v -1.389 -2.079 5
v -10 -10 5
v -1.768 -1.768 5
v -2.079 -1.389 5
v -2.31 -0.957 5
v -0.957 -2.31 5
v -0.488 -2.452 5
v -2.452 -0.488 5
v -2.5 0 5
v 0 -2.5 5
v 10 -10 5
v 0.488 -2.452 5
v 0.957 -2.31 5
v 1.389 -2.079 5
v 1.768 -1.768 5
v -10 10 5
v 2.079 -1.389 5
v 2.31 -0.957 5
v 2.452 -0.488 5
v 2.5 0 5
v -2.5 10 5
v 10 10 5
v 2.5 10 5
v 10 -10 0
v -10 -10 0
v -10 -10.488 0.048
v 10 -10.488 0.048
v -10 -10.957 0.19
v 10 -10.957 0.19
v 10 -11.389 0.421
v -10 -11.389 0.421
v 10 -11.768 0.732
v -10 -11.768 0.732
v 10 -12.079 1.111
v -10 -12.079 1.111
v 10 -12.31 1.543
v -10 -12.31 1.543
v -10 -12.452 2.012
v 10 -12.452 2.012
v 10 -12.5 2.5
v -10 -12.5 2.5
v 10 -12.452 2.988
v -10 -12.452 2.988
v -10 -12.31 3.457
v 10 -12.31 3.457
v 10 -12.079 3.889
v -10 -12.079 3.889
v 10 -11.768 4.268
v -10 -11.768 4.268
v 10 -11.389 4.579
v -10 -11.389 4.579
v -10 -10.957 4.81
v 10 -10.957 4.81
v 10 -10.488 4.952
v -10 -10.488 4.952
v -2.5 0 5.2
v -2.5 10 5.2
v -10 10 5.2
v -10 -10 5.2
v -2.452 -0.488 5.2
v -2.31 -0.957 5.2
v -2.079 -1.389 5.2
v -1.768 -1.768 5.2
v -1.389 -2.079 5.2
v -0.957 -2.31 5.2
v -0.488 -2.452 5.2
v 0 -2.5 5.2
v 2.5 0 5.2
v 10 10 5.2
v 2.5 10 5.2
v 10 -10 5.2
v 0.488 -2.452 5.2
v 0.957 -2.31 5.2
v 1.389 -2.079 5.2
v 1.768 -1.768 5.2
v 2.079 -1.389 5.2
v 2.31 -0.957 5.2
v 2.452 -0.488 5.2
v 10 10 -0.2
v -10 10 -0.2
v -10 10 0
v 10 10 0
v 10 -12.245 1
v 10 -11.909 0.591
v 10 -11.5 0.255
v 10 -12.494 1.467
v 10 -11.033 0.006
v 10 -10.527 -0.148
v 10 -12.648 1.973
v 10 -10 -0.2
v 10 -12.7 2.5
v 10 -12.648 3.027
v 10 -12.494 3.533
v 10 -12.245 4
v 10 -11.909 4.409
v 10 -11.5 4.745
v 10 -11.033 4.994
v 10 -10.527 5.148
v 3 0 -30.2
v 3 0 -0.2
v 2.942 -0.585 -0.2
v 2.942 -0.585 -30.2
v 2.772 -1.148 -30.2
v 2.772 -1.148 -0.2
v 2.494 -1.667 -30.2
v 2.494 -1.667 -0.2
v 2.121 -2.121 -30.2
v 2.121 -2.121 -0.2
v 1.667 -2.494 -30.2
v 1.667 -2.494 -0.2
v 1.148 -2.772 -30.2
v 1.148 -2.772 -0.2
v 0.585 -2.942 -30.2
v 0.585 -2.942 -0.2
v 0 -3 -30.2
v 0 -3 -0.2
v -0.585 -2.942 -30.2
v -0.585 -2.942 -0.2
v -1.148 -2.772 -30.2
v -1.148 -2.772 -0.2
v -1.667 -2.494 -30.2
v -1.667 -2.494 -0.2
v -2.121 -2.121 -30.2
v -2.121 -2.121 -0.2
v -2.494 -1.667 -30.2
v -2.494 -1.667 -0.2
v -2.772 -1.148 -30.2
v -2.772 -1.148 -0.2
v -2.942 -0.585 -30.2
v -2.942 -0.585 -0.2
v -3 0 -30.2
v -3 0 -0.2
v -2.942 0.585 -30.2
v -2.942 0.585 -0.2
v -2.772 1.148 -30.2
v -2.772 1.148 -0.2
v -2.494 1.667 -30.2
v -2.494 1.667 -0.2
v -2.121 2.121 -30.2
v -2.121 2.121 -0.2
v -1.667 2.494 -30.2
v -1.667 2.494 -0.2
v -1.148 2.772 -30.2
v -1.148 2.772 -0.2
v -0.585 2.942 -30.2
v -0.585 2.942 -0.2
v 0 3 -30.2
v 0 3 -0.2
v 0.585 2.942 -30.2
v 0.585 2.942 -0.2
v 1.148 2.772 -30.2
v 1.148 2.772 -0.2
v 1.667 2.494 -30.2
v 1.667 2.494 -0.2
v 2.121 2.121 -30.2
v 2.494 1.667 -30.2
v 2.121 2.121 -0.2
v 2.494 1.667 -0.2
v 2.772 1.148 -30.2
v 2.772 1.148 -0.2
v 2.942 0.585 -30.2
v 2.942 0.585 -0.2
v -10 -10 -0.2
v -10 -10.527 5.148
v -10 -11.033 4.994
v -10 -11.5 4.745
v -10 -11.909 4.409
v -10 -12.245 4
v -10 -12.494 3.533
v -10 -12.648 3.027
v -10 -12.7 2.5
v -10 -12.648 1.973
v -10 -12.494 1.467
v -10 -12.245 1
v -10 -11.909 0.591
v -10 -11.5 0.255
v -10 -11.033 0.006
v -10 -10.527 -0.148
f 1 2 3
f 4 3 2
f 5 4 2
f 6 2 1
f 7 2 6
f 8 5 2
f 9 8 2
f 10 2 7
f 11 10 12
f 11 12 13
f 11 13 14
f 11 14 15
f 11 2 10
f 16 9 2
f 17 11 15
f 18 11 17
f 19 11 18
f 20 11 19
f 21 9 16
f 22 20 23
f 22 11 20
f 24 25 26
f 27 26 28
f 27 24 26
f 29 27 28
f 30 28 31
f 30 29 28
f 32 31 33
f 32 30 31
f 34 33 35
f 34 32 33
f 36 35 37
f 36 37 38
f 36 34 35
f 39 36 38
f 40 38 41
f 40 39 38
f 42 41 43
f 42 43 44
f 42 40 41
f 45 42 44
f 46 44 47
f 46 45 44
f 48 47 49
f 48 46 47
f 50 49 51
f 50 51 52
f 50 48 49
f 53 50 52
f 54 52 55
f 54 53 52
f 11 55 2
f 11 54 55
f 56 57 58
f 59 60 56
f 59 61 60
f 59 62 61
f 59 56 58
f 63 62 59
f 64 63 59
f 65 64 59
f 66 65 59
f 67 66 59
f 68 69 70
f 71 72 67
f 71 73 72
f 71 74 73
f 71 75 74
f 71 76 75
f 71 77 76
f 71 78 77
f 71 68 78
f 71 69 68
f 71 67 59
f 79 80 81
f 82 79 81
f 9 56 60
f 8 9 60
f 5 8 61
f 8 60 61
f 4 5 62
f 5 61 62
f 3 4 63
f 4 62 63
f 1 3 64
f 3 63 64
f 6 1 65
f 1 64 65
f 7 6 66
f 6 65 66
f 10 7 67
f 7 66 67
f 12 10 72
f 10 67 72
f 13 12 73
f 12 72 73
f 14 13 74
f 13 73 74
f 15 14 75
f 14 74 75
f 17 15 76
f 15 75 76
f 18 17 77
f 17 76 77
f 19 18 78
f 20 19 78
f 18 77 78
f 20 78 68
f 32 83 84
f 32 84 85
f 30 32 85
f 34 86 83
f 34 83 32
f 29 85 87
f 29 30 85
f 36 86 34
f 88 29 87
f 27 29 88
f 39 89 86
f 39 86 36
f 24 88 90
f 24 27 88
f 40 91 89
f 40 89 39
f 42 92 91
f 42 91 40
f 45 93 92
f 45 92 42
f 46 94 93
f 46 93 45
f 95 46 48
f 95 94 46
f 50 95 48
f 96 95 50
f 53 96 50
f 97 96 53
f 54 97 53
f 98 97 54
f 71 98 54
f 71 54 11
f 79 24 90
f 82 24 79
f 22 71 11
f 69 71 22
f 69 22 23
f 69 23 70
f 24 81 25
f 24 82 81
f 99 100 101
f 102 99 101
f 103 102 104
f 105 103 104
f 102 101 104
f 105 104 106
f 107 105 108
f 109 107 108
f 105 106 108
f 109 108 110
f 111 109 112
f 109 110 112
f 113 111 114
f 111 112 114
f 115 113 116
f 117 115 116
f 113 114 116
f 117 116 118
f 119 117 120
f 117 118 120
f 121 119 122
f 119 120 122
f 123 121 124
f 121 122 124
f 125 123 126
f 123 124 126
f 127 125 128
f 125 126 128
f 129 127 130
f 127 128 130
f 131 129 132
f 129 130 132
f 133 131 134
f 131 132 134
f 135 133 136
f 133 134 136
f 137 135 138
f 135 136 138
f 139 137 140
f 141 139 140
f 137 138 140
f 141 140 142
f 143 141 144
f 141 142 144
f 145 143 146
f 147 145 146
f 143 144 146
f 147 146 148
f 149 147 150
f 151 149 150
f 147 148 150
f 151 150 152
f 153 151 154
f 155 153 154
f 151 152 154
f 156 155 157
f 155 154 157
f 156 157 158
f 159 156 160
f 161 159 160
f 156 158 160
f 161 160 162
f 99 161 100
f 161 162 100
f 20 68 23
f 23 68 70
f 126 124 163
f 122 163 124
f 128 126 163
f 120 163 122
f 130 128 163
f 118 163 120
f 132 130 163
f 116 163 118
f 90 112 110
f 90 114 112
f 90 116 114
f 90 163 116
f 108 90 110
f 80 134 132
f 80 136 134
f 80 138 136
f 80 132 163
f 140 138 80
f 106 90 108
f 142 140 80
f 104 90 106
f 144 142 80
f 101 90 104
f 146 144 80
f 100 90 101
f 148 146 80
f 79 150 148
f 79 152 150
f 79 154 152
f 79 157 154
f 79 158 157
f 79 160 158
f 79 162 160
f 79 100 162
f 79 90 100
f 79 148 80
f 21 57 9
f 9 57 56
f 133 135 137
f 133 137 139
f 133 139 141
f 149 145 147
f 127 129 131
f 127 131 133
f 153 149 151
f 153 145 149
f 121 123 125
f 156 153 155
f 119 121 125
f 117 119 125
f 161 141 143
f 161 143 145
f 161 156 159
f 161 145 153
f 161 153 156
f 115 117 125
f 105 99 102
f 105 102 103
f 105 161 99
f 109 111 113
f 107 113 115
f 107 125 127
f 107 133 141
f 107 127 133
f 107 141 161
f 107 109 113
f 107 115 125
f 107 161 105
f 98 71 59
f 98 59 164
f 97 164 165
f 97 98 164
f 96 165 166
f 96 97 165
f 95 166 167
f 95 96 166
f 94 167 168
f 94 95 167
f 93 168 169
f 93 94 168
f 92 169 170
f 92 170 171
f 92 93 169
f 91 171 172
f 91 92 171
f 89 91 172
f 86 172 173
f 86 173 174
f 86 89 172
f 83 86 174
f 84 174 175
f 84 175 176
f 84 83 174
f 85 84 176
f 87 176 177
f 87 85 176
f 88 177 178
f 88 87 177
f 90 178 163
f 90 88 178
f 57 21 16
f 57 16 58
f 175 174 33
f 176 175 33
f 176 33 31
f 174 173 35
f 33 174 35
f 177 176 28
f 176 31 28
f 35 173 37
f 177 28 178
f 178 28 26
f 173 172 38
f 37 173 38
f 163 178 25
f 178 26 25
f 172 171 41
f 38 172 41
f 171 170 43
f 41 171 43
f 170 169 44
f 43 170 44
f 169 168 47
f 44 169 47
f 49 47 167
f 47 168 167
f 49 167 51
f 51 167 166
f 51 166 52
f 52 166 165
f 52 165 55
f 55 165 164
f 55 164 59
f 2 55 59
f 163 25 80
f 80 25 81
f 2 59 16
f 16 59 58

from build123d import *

# Parameters (mm, degrees)
F1_DEPTH = 10
F3_DEPTH = 0.2
F4_R     = 3
F5_DEPTH = 30


with BuildPart() as f1:
    # F0 (on Right) → F1 (new body, symmetric)
    with BuildSketch(Plane.YZ):
        with BuildLine():
            Line((-10, 5), (10, 5))
            Line((10, 5), (10, 5.2))
            Line((10, 5.2), (-10, 5.2))
            ThreePointArc((-10, 5.2), (-12.7, 2.5), (-10, -0.2))
            Line((-10, -0.2), (10, -0.2))
            Line((10, -0.2), (10, 0))
            Line((10, 0), (-10, 0))
            ThreePointArc((-10, 0), (-12.5, 2.5), (-10, 5))
        make_face()
    extrude(amount=F1_DEPTH, both=True)

    # F2 (on face) → F3 (cut, through all)
    with BuildSketch(Plane.XY.offset(5.2)):
        with BuildLine():
            Line((-2.5, 10), (-2.5, 0))
            ThreePointArc((-2.5, 0), (0, -2.5), (2.5, 0))
            Line((2.5, 0), (2.5, 10))
            Line((2.5, 10), (-2.5, 10))
        make_face()
    extrude(amount=-F3_DEPTH, mode=Mode.SUBTRACT)

    # F4 (on face) → F5 (join)
    with BuildSketch(Plane(origin=(0, 0, -0.2), x_dir=(1, 0, 0), z_dir=(0, 0, -1))):
        Circle(F4_R)
    extrude(amount=F5_DEPTH)


solid = f1.part
